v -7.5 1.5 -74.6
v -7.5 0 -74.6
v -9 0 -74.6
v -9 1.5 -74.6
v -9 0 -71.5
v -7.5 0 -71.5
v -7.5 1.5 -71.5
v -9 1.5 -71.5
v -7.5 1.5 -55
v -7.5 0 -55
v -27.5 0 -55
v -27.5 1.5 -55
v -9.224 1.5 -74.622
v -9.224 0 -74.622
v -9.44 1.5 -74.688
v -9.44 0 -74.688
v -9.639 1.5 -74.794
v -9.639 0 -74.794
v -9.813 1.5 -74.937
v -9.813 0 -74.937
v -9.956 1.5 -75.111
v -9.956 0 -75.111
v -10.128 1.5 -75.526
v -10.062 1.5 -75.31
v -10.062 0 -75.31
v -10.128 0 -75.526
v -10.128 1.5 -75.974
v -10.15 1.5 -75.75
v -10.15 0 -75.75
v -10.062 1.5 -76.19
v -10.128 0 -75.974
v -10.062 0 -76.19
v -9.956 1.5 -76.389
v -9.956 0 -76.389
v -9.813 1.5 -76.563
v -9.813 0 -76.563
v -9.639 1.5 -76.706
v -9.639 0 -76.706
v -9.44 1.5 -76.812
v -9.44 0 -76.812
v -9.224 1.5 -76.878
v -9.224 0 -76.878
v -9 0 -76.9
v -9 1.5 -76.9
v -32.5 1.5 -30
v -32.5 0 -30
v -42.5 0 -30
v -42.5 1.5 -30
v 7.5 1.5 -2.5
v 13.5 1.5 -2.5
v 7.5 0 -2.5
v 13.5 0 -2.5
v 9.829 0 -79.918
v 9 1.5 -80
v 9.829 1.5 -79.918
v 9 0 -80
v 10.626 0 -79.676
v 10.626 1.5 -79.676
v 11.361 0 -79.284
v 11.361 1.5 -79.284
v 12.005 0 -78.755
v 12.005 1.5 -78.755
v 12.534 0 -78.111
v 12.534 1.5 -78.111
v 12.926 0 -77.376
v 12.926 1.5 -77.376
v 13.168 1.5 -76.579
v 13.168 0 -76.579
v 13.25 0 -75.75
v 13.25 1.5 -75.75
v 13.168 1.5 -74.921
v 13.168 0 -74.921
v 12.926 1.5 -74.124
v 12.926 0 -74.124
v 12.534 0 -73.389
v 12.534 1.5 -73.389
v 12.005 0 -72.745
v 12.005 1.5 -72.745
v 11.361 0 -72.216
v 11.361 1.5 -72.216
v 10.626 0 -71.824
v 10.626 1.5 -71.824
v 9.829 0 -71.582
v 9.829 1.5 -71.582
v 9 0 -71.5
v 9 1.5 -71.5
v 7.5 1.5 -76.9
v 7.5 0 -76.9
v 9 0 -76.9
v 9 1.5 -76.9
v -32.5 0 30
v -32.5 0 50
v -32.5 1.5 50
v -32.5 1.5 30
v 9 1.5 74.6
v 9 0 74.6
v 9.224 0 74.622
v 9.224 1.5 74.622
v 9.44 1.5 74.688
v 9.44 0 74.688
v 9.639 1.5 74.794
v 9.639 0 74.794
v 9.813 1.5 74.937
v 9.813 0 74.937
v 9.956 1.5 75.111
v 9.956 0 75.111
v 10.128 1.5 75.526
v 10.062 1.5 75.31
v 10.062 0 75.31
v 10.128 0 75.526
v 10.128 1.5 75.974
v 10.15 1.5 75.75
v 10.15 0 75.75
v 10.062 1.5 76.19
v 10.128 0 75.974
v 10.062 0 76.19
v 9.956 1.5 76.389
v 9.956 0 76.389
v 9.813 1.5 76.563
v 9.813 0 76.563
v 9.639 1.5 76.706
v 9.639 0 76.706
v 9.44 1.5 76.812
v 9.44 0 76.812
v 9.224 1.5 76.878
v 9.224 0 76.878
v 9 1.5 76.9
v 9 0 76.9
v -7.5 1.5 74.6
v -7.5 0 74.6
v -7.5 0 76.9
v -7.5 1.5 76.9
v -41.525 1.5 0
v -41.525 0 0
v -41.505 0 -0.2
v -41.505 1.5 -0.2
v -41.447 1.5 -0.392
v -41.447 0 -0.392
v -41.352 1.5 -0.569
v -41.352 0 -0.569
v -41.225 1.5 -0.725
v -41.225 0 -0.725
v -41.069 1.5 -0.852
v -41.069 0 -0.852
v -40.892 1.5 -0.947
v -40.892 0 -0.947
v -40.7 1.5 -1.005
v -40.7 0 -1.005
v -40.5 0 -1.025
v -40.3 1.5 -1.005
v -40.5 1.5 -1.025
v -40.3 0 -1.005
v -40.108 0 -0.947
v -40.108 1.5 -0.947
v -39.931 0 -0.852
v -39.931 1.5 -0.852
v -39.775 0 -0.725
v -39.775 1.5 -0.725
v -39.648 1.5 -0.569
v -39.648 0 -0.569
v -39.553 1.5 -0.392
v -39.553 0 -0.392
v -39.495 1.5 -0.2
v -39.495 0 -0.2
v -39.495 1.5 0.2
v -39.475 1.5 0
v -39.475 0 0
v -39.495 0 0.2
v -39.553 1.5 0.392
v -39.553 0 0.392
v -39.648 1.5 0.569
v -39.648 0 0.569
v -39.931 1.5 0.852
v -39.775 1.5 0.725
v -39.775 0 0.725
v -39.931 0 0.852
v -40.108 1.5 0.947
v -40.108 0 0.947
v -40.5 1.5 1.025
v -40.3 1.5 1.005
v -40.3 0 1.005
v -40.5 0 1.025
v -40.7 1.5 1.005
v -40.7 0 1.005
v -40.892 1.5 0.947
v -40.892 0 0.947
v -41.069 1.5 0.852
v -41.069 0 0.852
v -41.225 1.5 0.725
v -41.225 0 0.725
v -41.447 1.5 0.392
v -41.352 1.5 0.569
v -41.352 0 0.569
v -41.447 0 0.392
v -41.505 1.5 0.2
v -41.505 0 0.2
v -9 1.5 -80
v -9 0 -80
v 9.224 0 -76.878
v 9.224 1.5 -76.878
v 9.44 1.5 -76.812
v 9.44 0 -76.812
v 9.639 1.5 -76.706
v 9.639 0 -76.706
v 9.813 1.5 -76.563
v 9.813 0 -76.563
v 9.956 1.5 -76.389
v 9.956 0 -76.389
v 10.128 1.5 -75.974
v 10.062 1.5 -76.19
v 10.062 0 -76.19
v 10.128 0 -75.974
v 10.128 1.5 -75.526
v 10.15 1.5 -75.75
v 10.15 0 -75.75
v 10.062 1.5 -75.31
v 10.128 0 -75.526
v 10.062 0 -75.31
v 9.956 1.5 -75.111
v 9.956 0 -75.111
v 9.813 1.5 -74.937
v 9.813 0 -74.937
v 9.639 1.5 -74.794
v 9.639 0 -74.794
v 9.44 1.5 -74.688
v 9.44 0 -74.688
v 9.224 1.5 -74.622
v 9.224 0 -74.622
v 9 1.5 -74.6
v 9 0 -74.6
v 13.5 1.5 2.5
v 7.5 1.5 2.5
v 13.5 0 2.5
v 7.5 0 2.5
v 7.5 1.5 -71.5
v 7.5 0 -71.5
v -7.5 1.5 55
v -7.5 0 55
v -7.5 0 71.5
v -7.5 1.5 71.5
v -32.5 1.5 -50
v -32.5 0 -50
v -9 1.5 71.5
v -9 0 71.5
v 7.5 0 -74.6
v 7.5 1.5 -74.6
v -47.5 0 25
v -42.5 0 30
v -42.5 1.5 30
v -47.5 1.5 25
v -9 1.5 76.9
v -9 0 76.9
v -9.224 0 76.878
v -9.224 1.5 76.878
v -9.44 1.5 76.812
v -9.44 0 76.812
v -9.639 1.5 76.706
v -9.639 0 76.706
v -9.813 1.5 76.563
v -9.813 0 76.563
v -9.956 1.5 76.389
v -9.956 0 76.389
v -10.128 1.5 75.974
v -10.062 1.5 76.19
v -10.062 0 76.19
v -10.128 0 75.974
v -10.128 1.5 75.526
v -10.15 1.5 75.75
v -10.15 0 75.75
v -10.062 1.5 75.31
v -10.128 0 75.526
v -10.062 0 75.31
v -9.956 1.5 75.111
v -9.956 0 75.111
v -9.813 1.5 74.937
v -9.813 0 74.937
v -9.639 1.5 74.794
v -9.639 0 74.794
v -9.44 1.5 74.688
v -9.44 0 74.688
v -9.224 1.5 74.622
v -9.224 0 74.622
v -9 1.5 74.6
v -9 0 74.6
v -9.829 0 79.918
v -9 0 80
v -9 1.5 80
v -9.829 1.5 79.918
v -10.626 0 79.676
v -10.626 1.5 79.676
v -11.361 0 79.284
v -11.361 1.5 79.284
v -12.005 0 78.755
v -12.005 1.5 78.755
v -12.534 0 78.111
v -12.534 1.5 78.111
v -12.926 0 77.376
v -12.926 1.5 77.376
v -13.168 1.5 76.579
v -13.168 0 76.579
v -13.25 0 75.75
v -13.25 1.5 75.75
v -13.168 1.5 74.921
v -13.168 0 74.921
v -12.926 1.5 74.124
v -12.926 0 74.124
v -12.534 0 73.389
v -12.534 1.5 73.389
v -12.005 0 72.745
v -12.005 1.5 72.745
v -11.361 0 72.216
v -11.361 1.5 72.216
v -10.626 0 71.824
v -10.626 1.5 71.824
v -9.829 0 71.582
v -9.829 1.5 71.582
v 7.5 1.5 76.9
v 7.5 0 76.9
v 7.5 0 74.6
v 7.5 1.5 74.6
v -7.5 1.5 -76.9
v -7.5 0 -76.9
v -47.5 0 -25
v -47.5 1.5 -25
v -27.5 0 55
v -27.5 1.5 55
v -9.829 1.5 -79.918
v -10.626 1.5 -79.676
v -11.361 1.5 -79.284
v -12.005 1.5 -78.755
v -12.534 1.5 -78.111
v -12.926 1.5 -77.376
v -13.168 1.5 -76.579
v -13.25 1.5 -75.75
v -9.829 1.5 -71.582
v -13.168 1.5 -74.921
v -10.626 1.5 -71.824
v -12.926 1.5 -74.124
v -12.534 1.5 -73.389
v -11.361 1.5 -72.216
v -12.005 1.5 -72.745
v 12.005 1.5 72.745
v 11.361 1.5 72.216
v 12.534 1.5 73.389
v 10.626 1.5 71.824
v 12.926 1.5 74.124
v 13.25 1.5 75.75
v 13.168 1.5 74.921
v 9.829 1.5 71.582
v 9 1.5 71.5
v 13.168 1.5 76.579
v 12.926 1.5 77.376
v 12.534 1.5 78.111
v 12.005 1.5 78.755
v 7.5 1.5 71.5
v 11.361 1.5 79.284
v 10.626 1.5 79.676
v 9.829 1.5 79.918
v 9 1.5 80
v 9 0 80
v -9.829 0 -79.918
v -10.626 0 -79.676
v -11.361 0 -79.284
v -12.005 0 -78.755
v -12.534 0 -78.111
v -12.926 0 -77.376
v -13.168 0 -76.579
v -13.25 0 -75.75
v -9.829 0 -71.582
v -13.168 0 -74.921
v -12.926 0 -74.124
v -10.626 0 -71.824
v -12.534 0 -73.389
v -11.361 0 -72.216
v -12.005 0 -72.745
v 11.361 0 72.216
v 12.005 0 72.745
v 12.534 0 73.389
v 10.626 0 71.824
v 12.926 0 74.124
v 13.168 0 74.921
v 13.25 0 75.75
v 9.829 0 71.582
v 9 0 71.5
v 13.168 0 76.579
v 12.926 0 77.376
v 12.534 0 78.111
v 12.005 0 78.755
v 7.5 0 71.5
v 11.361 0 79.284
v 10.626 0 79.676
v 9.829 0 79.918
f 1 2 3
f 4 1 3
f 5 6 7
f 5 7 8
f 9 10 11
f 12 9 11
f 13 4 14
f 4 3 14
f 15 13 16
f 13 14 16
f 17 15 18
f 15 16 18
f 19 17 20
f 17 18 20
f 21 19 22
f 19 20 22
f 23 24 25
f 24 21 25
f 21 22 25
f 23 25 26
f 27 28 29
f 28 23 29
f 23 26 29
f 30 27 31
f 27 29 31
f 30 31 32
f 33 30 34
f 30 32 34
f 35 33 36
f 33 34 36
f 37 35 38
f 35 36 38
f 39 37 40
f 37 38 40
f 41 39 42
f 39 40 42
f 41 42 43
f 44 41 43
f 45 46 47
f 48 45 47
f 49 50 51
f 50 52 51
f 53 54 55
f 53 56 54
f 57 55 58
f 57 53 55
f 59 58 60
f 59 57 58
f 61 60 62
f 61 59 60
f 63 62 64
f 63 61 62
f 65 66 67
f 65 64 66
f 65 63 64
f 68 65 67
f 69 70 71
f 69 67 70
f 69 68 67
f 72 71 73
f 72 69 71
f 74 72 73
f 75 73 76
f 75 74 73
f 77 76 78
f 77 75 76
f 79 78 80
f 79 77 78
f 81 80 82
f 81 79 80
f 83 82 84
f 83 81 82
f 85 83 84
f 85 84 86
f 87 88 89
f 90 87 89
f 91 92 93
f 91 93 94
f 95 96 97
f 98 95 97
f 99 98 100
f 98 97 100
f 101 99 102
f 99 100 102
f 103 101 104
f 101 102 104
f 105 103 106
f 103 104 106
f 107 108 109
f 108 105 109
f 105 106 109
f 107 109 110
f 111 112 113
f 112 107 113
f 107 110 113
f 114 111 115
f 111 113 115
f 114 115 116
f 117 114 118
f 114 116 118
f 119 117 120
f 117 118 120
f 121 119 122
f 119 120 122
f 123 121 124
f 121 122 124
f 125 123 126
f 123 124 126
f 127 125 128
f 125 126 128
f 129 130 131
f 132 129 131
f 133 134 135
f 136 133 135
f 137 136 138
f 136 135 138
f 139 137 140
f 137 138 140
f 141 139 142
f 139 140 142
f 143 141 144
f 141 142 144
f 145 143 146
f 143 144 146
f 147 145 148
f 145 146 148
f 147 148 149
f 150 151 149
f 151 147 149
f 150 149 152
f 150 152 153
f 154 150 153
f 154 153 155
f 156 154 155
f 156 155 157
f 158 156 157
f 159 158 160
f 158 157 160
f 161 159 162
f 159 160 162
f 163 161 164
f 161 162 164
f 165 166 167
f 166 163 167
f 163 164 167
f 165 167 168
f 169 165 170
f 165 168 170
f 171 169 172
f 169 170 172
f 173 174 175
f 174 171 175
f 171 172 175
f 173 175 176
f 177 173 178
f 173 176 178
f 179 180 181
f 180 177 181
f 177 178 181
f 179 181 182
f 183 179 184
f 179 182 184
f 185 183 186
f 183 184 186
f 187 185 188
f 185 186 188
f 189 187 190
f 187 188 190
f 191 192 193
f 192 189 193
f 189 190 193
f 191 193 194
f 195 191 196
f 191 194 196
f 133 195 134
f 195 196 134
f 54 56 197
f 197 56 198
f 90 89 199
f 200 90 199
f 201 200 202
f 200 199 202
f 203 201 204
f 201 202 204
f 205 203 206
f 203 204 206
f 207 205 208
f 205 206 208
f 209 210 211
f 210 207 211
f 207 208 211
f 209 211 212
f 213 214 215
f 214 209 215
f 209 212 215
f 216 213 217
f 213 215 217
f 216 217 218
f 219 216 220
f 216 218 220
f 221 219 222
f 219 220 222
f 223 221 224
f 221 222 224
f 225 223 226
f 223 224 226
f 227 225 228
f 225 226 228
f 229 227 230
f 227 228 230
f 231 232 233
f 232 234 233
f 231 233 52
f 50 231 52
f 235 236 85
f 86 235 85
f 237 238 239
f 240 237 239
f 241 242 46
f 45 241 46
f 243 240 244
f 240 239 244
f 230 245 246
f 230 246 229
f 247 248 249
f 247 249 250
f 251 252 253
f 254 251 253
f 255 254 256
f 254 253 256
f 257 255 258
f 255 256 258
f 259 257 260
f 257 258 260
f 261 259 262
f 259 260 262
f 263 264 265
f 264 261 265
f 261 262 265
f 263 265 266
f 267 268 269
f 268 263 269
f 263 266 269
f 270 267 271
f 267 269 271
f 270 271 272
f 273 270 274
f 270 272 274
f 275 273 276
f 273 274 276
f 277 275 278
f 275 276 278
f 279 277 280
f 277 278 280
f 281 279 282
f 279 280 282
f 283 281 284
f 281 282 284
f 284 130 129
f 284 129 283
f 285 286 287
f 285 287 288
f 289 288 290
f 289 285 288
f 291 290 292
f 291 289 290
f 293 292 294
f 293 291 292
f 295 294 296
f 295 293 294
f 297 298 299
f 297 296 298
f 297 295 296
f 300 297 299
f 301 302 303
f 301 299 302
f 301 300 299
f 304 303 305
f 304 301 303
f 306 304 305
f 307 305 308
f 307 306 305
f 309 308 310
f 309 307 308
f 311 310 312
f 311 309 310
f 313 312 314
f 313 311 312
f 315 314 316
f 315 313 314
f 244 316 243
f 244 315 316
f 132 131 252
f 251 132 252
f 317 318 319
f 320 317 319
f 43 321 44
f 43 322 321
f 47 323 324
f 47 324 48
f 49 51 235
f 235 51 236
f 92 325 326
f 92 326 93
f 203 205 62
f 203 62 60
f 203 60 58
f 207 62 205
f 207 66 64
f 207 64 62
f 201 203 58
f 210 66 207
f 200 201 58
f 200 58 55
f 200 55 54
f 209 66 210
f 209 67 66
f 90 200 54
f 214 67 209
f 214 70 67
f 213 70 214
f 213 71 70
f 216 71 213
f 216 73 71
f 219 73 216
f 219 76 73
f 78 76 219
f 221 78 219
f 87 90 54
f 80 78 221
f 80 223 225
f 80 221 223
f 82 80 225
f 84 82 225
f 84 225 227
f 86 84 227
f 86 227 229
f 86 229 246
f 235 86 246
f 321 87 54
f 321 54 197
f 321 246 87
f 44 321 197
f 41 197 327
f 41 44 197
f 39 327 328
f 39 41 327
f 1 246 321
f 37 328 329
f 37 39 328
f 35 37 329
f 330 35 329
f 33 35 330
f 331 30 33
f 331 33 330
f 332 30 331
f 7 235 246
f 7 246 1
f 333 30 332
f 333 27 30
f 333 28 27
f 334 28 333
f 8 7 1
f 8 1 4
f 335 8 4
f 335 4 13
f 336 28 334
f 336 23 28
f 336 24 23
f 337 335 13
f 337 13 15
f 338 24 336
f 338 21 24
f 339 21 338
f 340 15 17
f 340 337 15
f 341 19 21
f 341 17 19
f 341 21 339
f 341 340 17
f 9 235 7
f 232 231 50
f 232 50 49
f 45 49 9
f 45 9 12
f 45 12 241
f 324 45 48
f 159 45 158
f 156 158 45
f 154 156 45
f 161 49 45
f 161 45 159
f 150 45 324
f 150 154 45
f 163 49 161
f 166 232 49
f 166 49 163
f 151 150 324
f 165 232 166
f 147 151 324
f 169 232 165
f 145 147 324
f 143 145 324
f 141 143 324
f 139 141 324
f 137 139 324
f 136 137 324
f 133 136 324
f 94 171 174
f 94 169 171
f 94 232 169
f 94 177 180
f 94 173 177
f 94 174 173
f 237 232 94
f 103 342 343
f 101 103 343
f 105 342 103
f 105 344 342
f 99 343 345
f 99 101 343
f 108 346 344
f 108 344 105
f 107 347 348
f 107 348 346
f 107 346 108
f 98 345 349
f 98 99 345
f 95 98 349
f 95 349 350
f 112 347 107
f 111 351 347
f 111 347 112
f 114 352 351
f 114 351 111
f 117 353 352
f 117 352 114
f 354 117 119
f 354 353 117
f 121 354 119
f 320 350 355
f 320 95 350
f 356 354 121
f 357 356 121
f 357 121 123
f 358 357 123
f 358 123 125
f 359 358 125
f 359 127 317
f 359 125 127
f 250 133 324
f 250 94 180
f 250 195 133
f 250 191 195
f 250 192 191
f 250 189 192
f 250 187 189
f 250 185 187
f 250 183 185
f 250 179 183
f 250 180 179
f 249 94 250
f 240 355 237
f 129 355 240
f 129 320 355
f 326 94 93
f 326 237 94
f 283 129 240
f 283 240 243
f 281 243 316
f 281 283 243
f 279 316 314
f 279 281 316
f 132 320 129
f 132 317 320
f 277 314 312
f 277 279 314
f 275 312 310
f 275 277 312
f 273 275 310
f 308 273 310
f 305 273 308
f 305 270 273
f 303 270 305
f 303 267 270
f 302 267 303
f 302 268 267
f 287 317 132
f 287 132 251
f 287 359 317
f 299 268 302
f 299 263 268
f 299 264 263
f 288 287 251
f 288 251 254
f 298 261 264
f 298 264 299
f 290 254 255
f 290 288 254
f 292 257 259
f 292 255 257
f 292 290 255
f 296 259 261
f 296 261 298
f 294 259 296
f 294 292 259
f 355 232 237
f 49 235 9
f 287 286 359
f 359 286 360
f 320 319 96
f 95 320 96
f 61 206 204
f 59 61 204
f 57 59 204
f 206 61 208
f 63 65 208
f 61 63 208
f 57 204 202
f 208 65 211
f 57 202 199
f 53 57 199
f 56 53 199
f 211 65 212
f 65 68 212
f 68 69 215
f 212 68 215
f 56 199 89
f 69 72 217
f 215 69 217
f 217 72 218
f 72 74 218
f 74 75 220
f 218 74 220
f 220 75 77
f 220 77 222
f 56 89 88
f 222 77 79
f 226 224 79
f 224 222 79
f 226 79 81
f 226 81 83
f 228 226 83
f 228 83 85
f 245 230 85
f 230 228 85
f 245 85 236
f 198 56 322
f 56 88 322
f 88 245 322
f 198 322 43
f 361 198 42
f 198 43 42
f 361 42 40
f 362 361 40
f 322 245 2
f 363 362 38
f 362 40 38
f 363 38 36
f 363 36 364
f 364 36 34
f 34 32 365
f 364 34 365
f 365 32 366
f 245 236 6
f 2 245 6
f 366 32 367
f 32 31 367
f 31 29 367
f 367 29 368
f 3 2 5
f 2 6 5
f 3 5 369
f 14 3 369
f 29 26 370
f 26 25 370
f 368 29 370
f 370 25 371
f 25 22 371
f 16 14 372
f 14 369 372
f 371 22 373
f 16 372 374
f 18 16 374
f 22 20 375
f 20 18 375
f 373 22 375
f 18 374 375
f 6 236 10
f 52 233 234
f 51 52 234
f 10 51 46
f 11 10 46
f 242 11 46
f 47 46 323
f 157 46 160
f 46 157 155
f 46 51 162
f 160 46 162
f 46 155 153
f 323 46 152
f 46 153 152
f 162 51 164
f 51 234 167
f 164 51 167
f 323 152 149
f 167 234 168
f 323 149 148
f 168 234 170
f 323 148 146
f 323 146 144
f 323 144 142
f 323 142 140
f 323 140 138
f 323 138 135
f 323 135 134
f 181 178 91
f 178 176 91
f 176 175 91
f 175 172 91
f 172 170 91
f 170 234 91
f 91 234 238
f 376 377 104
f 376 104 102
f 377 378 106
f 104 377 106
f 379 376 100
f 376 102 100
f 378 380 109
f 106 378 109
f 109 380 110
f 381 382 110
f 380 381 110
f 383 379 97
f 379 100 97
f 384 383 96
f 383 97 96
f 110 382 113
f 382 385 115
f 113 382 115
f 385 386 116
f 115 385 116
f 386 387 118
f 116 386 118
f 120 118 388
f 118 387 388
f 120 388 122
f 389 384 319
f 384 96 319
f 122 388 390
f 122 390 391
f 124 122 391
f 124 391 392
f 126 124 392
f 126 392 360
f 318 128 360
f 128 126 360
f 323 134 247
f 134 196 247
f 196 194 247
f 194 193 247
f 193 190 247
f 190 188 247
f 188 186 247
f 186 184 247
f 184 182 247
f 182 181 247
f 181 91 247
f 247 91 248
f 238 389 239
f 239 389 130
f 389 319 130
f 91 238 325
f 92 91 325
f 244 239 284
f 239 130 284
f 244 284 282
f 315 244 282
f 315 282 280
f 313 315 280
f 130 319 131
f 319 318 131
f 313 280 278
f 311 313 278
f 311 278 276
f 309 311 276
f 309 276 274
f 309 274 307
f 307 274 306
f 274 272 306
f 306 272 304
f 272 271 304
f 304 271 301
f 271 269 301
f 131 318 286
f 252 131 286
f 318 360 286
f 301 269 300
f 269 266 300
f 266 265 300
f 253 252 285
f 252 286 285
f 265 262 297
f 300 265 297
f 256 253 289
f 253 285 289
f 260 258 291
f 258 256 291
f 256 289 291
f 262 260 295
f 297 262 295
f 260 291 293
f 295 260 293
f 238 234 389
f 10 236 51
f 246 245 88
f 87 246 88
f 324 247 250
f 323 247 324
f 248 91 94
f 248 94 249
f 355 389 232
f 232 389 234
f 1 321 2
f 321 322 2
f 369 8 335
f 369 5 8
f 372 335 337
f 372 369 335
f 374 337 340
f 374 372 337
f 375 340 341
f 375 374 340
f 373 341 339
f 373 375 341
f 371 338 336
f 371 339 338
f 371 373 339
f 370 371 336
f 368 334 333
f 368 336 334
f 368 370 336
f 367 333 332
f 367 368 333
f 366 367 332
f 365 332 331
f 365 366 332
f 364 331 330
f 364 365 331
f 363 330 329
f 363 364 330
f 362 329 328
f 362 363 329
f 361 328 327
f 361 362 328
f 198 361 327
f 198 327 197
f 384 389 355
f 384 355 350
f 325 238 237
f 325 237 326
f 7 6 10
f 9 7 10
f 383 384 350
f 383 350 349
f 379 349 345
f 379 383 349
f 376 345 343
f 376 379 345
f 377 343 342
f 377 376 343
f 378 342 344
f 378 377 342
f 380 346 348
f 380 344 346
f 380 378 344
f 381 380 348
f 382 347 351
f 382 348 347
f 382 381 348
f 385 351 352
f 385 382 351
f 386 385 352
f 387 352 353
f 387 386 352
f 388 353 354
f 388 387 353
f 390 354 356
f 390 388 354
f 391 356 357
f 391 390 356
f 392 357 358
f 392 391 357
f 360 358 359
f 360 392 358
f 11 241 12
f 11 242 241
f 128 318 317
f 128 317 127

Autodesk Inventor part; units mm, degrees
ref_plane "YZ Plane" through (0, 0, 0) normal (1, 0, 0) x (0, 1, 0)
ref_plane "XZ Plane" through (0, 0, 0) normal (0, 1, 0) x (-1, 0, 0)
ref_plane "XY Plane" through (0, 0, 0) normal (0, 0, 1) x (1, 0, 0)
sketch "Sketch1" plane through (0, 0, 0) normal (0, 1, 0) x (-1, 0, 0)
  line L0 (7.5, 80) -> (-7.5, 80)
  line L1 (-7.5, 80) -> (-7.5, -80)
  line L2 (-7.5, -80) -> (7.5, -80)
  line L3 (7.5, -80) -> (7.5, 80)
  line L4 (7.5, 80) -> (-7.5, -80) construction
  line L5 (7.5, -80) -> (-7.5, 80) construction
  line L6 (7.5, 75.75) -> (9, 75.75)
  line L7 (7.5, 80) -> (9, 80)
  line L8 (7.5, 71.5) -> (9, 71.5)
  arc A0 (9, 71.5) -> (9, 80) centre (9, 75.75) ccw
  line L9 (7.5, 74.6) -> (9, 74.6)
  line L10 (7.5, 76.9) -> (9, 76.9)
  arc A1 (9, 74.6) -> (9, 76.9) centre (9, 75.75) ccw
  line L11 (0, 80) -> (0, -80) construction
  line L12 (7.5, 0) -> (-7.5, 0) construction
  line L13 (-7.5, 75.75) -> (-9, 75.75)
  line L14 (-7.5, 80) -> (-9, 80)
  line L15 (-7.5, 71.5) -> (-9, 71.5)
  arc A2 (-9, 80) -> (-9, 71.5) centre (-9, 75.75) ccw
  line L16 (-7.5, 74.6) -> (-9, 74.6)
  line L17 (-7.5, 76.9) -> (-9, 76.9)
  arc A3 (-9, 76.9) -> (-9, 74.6) centre (-9, 75.75) ccw
  line L18 (7.5, -75.75) -> (9, -75.75)
  line L19 (7.5, -80) -> (9, -80)
  line L20 (7.5, -71.5) -> (9, -71.5)
  arc A4 (9, -80) -> (9, -71.5) centre (9, -75.75) ccw
  line L21 (7.5, -74.6) -> (9, -74.6)
  line L22 (7.5, -76.9) -> (9, -76.9)
  arc A5 (9, -76.9) -> (9, -74.6) centre (9, -75.75) ccw
  arc A6 (-9, -71.5) -> (-9, -80) centre (-9, -75.75) ccw
  line L23 (-7.5, -71.5) -> (-9, -71.5)
  line L24 (-7.5, -74.6) -> (-9, -74.6)
  arc A7 (-9, -74.6) -> (-9, -76.9) centre (-9, -75.75) ccw
  line L25 (-7.5, -75.75) -> (-9, -75.75)
  line L26 (-7.5, -76.9) -> (-9, -76.9)
  line L27 (-7.5, -80) -> (-9, -80)
  line L28 (7.5, 55) -> (27.5, 55)
  line L29 (32.5, 50) -> (32.5, 30)
  line L30 (32.5, 30) -> (42.5, 30)
  line L31 (47.5, 25) -> (47.5, 0)
  line L32 (64.2072, 0) -> (-38.11, 0) construction
  line L33 (7.5, -55) -> (27.5, -55)
  line L34 (32.5, -50) -> (32.5, -30)
  line L35 (32.5, -30) -> (42.5, -30)
  line L36 (47.5, -25) -> (47.5, 0)
  line L37 (27.5, 55) -> (32.5, 50)
  line L38 (42.5, 30) -> (47.5, 25)
  line L39 (47.5, -25) -> (42.5, -30)
  line L40 (32.5, -50) -> (27.5, -55)
  circle A8 centre (40.5, 0) radius 1.025
  circle A9 centre (-11.5, 0) radius 1.025
  line L41 (-7.5, 2.5) -> (-13.5, 2.5)
  line L42 (-13.5, 2.5) -> (-13.5, -2.5)
  line L43 (-13.5, -2.5) -> (-7.5, -2.5)
  line L44 (-7.5, -2.5) -> (-7.5, 2.5)
  point P0 (0, 0)
  point P1 (0, 0)
  point P2 (8.25, 71.5)
  point P3 (32.5, 55)
  point P4 (47.5, 30)
  point P5 (32.5, -55)
  point P6 (47.5, -30)
  dimension "d0" = 160
  dimension "d1" = 15
  dimension "d2" = 1.5
  dimension "d3" = 4.25
  dimension "d5" = 4.25
  dimension "d6" = 4.25
  dimension "d7" = 1.15
  dimension "d8" = 1.15
  dimension "d9" = 1.15
  dimension "d10" = 25
  dimension "d11" = 25
  dimension "d12" = 15
  dimension "d13" = 25
  dimension "d14" = 25
  dimension "d15" = 5
  dimension "d16" = 5
  dimension "d17" = 5
  dimension "d18" = 5
  dimension "d19" = 5
  dimension "d20" = 5
  dimension "d21" = 5
  dimension "d22" = 5
  dimension "d24" = 2.05
  dimension "d25" = 7
  dimension "d26" = 2.05
  dimension "d27" = 4
  dimension "d28" = 2.5
  dimension "d29" = 2.5
  dimension "d30" = 6
extrude "Extrusion1" add sketch "Sketch1" along normal blind 1.5 contours L3 L2 L1 L0 | L7 A0 L8 L3 L9 A1 L10 | L1 L17 A3 L16 L15 A2 L14 | L28 L37 L29 L30 L38 L31 L36 L39 L35 L34 L40 L33 L3 | L1 L43 L42 L41 | L20 A4 L19 L3 L22 A5 L21 | L1 L24 A7 L26 L27 A6 L23 | A9
equation "\"d16\" = d15"
equation "\"d17\" = d15"
equation "\"d18\" = d17"
equation "\"d19\" = d15"
equation "\"d20\" = d19"
equation "\"d21\" = d15"
equation "\"d22\" = d21"
properties part number "linefollower_chassy_model_3"
